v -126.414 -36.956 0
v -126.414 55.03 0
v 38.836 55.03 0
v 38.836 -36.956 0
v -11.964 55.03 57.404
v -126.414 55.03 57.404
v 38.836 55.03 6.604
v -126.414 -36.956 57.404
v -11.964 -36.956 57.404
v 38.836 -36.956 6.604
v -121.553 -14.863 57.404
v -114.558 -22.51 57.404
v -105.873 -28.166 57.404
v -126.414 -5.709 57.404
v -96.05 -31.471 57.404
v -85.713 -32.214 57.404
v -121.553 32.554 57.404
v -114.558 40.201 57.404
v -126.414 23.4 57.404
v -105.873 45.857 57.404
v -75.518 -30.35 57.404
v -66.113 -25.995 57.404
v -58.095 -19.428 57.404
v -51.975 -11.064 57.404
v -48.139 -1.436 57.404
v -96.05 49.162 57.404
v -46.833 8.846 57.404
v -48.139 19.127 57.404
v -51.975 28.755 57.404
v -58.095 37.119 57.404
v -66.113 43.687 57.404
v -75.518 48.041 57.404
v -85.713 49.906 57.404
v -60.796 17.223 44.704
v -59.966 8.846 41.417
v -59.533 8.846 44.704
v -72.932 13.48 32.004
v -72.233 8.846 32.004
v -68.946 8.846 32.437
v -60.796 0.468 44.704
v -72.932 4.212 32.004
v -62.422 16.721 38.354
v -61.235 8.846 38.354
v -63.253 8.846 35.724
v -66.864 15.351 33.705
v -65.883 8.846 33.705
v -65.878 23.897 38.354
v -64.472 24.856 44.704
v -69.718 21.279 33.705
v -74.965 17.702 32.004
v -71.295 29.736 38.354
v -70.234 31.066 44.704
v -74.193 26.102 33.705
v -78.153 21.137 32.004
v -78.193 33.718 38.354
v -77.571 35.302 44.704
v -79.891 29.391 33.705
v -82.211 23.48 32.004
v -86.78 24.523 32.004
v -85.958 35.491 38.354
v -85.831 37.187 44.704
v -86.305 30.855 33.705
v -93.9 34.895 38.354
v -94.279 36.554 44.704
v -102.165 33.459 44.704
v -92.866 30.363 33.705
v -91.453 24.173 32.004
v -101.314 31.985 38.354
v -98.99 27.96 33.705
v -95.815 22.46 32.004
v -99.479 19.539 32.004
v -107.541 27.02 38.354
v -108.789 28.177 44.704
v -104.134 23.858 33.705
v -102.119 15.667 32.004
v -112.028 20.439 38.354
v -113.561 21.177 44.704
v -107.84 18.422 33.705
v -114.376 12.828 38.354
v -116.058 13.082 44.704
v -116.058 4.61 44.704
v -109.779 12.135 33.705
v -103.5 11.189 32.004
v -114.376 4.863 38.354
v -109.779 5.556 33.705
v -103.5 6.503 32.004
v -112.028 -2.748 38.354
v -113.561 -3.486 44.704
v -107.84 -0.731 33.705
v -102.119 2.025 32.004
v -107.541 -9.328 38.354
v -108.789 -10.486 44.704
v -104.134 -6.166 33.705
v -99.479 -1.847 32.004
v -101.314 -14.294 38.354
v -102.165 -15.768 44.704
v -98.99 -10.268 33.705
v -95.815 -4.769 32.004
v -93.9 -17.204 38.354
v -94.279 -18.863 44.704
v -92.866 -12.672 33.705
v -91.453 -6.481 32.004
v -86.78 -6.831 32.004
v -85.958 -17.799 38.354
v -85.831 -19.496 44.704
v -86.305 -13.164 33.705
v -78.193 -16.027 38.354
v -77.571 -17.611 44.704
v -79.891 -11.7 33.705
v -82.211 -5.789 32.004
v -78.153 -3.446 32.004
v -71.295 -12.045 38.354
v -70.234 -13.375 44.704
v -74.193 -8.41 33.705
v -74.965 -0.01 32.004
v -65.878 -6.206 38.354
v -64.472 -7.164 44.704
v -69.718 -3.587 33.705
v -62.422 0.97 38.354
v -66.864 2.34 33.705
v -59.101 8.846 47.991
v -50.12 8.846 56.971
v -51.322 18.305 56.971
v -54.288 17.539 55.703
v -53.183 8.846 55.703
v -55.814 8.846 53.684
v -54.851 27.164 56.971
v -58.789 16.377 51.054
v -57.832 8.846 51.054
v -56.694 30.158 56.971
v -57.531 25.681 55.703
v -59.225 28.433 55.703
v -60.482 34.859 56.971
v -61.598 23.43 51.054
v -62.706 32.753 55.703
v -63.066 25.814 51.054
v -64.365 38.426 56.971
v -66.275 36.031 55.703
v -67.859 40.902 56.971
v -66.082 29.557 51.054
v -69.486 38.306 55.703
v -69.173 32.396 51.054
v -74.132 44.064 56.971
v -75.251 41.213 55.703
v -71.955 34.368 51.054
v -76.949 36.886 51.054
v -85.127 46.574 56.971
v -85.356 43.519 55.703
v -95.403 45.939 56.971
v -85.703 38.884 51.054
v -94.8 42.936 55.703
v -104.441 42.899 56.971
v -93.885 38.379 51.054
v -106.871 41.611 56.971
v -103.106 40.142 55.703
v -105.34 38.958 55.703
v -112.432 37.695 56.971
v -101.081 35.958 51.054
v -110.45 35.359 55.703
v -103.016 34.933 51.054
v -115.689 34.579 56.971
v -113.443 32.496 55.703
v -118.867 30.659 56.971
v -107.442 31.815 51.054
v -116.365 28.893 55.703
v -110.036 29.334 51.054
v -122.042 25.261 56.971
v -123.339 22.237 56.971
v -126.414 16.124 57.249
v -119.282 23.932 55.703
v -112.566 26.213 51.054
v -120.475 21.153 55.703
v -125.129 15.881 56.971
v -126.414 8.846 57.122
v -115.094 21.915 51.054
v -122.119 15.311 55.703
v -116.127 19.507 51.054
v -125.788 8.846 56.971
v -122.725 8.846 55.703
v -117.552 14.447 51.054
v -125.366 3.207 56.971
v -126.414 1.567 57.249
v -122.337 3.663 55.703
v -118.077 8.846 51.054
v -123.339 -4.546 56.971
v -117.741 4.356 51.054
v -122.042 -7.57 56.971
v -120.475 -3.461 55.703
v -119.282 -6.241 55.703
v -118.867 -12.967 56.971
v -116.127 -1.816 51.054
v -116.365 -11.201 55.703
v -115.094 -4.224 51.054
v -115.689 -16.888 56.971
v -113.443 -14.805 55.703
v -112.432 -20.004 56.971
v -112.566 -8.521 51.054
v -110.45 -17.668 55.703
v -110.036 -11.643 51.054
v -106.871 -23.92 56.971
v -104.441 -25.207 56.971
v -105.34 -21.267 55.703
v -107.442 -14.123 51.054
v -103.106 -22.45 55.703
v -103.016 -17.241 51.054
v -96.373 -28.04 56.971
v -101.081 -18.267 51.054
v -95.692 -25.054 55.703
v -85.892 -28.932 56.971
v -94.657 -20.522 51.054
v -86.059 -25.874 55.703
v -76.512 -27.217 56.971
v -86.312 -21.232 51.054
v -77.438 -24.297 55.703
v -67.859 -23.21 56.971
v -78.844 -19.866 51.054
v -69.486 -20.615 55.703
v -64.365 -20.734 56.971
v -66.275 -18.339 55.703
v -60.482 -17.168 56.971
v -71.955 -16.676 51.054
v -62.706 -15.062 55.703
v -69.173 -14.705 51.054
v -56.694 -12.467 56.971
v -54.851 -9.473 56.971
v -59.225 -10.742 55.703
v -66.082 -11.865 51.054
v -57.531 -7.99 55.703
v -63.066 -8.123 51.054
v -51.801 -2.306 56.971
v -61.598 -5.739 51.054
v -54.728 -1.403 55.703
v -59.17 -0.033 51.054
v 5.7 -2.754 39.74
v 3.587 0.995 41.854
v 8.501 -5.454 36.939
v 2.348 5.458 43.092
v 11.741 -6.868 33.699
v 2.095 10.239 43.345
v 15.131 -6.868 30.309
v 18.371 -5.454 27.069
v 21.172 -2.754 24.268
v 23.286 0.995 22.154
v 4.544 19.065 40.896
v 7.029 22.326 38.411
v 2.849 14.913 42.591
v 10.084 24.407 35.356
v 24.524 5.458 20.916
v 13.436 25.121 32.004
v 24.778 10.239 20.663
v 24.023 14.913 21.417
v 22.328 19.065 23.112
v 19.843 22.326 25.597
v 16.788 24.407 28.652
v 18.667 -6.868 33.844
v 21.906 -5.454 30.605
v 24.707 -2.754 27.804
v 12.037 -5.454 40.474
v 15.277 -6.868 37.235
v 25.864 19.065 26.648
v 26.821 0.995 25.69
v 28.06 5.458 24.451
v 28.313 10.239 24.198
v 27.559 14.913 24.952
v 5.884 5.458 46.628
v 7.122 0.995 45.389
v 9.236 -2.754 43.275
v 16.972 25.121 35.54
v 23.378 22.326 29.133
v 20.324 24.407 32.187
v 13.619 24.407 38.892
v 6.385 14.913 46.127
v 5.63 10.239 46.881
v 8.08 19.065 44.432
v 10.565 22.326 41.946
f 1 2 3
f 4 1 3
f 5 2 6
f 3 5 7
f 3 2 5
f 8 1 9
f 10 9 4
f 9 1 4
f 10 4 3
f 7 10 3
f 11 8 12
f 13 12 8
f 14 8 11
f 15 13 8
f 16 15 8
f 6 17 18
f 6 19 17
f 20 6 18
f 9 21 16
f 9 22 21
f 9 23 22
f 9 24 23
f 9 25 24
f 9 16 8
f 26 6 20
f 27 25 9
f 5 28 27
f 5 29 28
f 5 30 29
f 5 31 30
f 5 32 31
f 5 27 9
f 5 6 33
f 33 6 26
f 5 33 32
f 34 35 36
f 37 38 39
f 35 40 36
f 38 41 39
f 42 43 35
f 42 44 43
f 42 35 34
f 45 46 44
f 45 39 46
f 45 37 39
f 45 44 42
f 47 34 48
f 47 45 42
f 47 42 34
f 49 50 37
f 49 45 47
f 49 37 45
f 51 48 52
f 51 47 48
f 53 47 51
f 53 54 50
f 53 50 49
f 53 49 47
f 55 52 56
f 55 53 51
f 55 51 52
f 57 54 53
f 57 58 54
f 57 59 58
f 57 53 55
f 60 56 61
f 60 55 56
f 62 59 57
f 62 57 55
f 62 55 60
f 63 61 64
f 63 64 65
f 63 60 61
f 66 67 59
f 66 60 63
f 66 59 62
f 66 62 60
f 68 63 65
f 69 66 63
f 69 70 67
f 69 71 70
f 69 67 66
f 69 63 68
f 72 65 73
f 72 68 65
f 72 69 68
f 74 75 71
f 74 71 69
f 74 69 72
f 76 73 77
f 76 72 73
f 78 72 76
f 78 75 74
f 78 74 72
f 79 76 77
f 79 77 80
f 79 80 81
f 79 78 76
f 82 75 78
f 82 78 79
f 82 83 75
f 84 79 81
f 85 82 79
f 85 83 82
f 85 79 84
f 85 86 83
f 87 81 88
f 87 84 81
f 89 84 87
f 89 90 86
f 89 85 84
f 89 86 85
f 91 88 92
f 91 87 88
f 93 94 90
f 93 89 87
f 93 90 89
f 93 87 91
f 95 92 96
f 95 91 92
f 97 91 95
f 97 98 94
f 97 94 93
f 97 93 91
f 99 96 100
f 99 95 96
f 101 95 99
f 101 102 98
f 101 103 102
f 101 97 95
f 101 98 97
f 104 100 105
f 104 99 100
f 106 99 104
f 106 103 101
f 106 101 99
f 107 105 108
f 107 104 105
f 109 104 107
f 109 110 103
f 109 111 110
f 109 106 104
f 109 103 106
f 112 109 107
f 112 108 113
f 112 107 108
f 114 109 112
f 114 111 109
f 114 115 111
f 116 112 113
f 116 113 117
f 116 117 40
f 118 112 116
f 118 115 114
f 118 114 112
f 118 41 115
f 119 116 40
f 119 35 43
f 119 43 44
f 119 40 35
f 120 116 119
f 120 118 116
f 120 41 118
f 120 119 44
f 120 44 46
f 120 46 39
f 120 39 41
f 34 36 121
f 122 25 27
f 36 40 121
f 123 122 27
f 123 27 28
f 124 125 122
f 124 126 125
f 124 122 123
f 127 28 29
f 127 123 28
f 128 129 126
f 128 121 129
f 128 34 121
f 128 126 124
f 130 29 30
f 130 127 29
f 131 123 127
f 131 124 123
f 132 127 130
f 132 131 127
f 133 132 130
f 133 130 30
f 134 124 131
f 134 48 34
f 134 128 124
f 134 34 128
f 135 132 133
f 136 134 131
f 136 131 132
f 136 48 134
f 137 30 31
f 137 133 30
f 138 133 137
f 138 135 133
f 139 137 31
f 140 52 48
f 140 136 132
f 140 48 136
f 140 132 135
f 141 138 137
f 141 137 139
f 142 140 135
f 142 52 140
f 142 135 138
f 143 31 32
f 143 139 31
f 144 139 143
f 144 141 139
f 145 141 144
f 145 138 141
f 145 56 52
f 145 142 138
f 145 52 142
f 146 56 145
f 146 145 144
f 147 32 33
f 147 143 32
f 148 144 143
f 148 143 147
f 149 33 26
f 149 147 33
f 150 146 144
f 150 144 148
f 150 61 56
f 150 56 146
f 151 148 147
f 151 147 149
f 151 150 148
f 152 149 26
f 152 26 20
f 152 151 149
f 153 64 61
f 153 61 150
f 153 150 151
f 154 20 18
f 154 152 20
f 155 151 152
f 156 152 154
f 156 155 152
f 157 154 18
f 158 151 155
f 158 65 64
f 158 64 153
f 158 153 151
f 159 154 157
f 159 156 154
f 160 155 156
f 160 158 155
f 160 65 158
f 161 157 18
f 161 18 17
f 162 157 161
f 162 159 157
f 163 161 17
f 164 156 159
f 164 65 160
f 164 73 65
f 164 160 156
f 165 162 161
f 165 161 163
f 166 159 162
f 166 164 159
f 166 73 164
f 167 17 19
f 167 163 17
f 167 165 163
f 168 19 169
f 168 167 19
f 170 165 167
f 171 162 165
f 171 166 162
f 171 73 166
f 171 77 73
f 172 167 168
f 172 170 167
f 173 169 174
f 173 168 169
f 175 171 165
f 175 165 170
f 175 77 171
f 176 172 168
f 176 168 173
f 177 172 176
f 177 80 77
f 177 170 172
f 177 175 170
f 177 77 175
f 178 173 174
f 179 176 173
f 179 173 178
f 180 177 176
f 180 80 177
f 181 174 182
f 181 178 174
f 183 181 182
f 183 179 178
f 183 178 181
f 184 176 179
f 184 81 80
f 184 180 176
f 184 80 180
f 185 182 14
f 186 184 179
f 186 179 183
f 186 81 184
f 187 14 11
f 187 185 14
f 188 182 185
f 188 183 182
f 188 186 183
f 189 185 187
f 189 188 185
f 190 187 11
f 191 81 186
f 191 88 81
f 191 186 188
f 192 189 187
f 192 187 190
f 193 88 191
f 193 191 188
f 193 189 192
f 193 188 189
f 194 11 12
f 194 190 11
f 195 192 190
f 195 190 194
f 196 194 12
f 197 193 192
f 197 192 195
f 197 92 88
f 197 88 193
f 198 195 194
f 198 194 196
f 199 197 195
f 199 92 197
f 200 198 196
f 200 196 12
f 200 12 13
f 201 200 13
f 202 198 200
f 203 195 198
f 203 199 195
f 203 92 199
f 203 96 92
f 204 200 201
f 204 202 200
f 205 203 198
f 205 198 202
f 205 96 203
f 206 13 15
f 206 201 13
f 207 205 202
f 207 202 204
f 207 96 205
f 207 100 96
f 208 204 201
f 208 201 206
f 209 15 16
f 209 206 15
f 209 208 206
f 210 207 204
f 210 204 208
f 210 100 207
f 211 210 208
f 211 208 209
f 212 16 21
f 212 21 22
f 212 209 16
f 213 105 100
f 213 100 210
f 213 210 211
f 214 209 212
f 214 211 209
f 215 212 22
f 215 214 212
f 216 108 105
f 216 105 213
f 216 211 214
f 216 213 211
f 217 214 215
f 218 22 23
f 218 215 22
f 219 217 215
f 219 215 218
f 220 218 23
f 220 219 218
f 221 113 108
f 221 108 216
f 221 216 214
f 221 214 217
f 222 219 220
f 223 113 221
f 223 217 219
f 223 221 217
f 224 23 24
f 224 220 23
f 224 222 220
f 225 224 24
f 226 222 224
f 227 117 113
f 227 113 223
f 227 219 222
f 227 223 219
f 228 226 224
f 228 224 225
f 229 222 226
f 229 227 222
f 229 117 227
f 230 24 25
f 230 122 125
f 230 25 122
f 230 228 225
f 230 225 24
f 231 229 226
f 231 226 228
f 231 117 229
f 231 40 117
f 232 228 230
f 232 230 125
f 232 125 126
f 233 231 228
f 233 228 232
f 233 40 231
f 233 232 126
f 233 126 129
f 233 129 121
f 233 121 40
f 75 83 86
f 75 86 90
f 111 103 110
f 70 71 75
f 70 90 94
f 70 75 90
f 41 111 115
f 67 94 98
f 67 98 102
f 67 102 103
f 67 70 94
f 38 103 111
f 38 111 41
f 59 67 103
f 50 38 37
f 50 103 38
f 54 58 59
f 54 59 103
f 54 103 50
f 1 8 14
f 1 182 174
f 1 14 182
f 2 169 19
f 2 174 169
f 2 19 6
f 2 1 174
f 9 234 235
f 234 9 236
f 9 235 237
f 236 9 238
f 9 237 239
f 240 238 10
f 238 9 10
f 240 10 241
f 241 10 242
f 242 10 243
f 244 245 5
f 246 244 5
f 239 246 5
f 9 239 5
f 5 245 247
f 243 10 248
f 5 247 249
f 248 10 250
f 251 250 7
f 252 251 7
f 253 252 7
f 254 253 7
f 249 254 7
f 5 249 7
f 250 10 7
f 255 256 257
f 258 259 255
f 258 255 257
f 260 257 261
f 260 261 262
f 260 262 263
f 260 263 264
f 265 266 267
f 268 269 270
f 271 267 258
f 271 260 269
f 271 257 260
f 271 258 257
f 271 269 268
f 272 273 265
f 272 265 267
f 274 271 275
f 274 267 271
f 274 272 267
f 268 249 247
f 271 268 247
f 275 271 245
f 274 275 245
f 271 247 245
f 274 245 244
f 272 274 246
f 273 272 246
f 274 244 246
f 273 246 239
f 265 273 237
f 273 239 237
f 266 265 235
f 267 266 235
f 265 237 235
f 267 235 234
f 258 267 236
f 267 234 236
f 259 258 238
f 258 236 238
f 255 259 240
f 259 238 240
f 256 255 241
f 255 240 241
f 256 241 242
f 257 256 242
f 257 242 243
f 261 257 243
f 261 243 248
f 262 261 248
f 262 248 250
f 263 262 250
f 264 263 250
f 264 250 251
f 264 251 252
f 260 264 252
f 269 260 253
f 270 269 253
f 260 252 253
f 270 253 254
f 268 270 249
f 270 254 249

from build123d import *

# Parameters (mm, degrees)
F0_W     = 165.2496345341
F0_H     = 91.986246407
F1_DEPTH = 57.404
F2_R     = 28.4210411612
F3_DEPTH = 25.4
F5_SIZE  = 50.8
F6_R     = 16.0842611484
F7_DEPTH = 5


# Not quite as in the source:
# - a fillet or chamfer that OpenCascade refuses, or shapes differently, is made with other operations: its cross-section is extruded or revolved along the edge and cut away or added


with BuildPart() as f1:
    # F0 (on Top) → F1 (new body)
    with BuildSketch(Plane.XY):
        with Locations((-43.7887068838, 9.0369544923)):
            Rectangle(F0_W, F0_H)
    extrude(amount=F1_DEPTH)

    # F2 (on face) → F3 (cut)
    with BuildSketch(Plane.XY.offset(57.404)):
        with Locations((-87.9544317722, 8.8456757367)):
            Circle(F2_R)
    extrude(amount=-F3_DEPTH, mode=Mode.SUBTRACT)

    # F4: fillet of radius 12.7 on 2 edges, made by hand

    # F4_s1 → F4_t2 (revolve)
    with BuildSketch(Plane.XZ.offset(-8.8456757367)):
        with BuildLine():
            ThreePointArc((-59.5333906111, 44.704), (-63.25313449, 35.7237438789), (-72.2333906111, 32.004))
            Line((-72.2333906111, 32.004), (-59.5333906111, 32.004))
            Line((-59.5333906111, 32.004), (-59.5333906111, 44.704))
        make_face()
    revolve(axis=Axis((-87.9544317722, 8.8456757367, 32.004), (0, 0, 1)))

    # F4_s3 → F4_t4 (revolve, cut)
    with BuildSketch(Plane.XZ.offset(-8.8456757367)):
        with BuildLine():
            ThreePointArc((-46.8333906111, 57.404), (-55.8136467322, 53.6842561211), (-59.5333906111, 44.704))
            Line((-59.5333906111, 44.704), (-59.5333906111, 57.404))
            Line((-59.5333906111, 57.404), (-46.8333906111, 57.404))
        make_face()
    revolve(axis=Axis((-87.9544317722, 8.8456757367, 57.404), (0, 0, 1)), mode=Mode.SUBTRACT)

    # F5
    f5_edges = [f1.edges().sort_by_distance(p)[0] for p in [
        (38.83611, 9.036954, 57.404),
    ]]
    chamfer(f5_edges, length=F5_SIZE)

    # F6 (on face) → F7 (join)
    with BuildSketch(Plane(origin=(22.7200551916, 0, 22.7200551916), x_dir=(0, 1, 0), z_dir=(0.7071067812, 0, 0.7071067812))):
        with Locations((9.0369544923, 13.1294806603)):
            Circle(F6_R)
    extrude(amount=F7_DEPTH)


solid = f1.part
